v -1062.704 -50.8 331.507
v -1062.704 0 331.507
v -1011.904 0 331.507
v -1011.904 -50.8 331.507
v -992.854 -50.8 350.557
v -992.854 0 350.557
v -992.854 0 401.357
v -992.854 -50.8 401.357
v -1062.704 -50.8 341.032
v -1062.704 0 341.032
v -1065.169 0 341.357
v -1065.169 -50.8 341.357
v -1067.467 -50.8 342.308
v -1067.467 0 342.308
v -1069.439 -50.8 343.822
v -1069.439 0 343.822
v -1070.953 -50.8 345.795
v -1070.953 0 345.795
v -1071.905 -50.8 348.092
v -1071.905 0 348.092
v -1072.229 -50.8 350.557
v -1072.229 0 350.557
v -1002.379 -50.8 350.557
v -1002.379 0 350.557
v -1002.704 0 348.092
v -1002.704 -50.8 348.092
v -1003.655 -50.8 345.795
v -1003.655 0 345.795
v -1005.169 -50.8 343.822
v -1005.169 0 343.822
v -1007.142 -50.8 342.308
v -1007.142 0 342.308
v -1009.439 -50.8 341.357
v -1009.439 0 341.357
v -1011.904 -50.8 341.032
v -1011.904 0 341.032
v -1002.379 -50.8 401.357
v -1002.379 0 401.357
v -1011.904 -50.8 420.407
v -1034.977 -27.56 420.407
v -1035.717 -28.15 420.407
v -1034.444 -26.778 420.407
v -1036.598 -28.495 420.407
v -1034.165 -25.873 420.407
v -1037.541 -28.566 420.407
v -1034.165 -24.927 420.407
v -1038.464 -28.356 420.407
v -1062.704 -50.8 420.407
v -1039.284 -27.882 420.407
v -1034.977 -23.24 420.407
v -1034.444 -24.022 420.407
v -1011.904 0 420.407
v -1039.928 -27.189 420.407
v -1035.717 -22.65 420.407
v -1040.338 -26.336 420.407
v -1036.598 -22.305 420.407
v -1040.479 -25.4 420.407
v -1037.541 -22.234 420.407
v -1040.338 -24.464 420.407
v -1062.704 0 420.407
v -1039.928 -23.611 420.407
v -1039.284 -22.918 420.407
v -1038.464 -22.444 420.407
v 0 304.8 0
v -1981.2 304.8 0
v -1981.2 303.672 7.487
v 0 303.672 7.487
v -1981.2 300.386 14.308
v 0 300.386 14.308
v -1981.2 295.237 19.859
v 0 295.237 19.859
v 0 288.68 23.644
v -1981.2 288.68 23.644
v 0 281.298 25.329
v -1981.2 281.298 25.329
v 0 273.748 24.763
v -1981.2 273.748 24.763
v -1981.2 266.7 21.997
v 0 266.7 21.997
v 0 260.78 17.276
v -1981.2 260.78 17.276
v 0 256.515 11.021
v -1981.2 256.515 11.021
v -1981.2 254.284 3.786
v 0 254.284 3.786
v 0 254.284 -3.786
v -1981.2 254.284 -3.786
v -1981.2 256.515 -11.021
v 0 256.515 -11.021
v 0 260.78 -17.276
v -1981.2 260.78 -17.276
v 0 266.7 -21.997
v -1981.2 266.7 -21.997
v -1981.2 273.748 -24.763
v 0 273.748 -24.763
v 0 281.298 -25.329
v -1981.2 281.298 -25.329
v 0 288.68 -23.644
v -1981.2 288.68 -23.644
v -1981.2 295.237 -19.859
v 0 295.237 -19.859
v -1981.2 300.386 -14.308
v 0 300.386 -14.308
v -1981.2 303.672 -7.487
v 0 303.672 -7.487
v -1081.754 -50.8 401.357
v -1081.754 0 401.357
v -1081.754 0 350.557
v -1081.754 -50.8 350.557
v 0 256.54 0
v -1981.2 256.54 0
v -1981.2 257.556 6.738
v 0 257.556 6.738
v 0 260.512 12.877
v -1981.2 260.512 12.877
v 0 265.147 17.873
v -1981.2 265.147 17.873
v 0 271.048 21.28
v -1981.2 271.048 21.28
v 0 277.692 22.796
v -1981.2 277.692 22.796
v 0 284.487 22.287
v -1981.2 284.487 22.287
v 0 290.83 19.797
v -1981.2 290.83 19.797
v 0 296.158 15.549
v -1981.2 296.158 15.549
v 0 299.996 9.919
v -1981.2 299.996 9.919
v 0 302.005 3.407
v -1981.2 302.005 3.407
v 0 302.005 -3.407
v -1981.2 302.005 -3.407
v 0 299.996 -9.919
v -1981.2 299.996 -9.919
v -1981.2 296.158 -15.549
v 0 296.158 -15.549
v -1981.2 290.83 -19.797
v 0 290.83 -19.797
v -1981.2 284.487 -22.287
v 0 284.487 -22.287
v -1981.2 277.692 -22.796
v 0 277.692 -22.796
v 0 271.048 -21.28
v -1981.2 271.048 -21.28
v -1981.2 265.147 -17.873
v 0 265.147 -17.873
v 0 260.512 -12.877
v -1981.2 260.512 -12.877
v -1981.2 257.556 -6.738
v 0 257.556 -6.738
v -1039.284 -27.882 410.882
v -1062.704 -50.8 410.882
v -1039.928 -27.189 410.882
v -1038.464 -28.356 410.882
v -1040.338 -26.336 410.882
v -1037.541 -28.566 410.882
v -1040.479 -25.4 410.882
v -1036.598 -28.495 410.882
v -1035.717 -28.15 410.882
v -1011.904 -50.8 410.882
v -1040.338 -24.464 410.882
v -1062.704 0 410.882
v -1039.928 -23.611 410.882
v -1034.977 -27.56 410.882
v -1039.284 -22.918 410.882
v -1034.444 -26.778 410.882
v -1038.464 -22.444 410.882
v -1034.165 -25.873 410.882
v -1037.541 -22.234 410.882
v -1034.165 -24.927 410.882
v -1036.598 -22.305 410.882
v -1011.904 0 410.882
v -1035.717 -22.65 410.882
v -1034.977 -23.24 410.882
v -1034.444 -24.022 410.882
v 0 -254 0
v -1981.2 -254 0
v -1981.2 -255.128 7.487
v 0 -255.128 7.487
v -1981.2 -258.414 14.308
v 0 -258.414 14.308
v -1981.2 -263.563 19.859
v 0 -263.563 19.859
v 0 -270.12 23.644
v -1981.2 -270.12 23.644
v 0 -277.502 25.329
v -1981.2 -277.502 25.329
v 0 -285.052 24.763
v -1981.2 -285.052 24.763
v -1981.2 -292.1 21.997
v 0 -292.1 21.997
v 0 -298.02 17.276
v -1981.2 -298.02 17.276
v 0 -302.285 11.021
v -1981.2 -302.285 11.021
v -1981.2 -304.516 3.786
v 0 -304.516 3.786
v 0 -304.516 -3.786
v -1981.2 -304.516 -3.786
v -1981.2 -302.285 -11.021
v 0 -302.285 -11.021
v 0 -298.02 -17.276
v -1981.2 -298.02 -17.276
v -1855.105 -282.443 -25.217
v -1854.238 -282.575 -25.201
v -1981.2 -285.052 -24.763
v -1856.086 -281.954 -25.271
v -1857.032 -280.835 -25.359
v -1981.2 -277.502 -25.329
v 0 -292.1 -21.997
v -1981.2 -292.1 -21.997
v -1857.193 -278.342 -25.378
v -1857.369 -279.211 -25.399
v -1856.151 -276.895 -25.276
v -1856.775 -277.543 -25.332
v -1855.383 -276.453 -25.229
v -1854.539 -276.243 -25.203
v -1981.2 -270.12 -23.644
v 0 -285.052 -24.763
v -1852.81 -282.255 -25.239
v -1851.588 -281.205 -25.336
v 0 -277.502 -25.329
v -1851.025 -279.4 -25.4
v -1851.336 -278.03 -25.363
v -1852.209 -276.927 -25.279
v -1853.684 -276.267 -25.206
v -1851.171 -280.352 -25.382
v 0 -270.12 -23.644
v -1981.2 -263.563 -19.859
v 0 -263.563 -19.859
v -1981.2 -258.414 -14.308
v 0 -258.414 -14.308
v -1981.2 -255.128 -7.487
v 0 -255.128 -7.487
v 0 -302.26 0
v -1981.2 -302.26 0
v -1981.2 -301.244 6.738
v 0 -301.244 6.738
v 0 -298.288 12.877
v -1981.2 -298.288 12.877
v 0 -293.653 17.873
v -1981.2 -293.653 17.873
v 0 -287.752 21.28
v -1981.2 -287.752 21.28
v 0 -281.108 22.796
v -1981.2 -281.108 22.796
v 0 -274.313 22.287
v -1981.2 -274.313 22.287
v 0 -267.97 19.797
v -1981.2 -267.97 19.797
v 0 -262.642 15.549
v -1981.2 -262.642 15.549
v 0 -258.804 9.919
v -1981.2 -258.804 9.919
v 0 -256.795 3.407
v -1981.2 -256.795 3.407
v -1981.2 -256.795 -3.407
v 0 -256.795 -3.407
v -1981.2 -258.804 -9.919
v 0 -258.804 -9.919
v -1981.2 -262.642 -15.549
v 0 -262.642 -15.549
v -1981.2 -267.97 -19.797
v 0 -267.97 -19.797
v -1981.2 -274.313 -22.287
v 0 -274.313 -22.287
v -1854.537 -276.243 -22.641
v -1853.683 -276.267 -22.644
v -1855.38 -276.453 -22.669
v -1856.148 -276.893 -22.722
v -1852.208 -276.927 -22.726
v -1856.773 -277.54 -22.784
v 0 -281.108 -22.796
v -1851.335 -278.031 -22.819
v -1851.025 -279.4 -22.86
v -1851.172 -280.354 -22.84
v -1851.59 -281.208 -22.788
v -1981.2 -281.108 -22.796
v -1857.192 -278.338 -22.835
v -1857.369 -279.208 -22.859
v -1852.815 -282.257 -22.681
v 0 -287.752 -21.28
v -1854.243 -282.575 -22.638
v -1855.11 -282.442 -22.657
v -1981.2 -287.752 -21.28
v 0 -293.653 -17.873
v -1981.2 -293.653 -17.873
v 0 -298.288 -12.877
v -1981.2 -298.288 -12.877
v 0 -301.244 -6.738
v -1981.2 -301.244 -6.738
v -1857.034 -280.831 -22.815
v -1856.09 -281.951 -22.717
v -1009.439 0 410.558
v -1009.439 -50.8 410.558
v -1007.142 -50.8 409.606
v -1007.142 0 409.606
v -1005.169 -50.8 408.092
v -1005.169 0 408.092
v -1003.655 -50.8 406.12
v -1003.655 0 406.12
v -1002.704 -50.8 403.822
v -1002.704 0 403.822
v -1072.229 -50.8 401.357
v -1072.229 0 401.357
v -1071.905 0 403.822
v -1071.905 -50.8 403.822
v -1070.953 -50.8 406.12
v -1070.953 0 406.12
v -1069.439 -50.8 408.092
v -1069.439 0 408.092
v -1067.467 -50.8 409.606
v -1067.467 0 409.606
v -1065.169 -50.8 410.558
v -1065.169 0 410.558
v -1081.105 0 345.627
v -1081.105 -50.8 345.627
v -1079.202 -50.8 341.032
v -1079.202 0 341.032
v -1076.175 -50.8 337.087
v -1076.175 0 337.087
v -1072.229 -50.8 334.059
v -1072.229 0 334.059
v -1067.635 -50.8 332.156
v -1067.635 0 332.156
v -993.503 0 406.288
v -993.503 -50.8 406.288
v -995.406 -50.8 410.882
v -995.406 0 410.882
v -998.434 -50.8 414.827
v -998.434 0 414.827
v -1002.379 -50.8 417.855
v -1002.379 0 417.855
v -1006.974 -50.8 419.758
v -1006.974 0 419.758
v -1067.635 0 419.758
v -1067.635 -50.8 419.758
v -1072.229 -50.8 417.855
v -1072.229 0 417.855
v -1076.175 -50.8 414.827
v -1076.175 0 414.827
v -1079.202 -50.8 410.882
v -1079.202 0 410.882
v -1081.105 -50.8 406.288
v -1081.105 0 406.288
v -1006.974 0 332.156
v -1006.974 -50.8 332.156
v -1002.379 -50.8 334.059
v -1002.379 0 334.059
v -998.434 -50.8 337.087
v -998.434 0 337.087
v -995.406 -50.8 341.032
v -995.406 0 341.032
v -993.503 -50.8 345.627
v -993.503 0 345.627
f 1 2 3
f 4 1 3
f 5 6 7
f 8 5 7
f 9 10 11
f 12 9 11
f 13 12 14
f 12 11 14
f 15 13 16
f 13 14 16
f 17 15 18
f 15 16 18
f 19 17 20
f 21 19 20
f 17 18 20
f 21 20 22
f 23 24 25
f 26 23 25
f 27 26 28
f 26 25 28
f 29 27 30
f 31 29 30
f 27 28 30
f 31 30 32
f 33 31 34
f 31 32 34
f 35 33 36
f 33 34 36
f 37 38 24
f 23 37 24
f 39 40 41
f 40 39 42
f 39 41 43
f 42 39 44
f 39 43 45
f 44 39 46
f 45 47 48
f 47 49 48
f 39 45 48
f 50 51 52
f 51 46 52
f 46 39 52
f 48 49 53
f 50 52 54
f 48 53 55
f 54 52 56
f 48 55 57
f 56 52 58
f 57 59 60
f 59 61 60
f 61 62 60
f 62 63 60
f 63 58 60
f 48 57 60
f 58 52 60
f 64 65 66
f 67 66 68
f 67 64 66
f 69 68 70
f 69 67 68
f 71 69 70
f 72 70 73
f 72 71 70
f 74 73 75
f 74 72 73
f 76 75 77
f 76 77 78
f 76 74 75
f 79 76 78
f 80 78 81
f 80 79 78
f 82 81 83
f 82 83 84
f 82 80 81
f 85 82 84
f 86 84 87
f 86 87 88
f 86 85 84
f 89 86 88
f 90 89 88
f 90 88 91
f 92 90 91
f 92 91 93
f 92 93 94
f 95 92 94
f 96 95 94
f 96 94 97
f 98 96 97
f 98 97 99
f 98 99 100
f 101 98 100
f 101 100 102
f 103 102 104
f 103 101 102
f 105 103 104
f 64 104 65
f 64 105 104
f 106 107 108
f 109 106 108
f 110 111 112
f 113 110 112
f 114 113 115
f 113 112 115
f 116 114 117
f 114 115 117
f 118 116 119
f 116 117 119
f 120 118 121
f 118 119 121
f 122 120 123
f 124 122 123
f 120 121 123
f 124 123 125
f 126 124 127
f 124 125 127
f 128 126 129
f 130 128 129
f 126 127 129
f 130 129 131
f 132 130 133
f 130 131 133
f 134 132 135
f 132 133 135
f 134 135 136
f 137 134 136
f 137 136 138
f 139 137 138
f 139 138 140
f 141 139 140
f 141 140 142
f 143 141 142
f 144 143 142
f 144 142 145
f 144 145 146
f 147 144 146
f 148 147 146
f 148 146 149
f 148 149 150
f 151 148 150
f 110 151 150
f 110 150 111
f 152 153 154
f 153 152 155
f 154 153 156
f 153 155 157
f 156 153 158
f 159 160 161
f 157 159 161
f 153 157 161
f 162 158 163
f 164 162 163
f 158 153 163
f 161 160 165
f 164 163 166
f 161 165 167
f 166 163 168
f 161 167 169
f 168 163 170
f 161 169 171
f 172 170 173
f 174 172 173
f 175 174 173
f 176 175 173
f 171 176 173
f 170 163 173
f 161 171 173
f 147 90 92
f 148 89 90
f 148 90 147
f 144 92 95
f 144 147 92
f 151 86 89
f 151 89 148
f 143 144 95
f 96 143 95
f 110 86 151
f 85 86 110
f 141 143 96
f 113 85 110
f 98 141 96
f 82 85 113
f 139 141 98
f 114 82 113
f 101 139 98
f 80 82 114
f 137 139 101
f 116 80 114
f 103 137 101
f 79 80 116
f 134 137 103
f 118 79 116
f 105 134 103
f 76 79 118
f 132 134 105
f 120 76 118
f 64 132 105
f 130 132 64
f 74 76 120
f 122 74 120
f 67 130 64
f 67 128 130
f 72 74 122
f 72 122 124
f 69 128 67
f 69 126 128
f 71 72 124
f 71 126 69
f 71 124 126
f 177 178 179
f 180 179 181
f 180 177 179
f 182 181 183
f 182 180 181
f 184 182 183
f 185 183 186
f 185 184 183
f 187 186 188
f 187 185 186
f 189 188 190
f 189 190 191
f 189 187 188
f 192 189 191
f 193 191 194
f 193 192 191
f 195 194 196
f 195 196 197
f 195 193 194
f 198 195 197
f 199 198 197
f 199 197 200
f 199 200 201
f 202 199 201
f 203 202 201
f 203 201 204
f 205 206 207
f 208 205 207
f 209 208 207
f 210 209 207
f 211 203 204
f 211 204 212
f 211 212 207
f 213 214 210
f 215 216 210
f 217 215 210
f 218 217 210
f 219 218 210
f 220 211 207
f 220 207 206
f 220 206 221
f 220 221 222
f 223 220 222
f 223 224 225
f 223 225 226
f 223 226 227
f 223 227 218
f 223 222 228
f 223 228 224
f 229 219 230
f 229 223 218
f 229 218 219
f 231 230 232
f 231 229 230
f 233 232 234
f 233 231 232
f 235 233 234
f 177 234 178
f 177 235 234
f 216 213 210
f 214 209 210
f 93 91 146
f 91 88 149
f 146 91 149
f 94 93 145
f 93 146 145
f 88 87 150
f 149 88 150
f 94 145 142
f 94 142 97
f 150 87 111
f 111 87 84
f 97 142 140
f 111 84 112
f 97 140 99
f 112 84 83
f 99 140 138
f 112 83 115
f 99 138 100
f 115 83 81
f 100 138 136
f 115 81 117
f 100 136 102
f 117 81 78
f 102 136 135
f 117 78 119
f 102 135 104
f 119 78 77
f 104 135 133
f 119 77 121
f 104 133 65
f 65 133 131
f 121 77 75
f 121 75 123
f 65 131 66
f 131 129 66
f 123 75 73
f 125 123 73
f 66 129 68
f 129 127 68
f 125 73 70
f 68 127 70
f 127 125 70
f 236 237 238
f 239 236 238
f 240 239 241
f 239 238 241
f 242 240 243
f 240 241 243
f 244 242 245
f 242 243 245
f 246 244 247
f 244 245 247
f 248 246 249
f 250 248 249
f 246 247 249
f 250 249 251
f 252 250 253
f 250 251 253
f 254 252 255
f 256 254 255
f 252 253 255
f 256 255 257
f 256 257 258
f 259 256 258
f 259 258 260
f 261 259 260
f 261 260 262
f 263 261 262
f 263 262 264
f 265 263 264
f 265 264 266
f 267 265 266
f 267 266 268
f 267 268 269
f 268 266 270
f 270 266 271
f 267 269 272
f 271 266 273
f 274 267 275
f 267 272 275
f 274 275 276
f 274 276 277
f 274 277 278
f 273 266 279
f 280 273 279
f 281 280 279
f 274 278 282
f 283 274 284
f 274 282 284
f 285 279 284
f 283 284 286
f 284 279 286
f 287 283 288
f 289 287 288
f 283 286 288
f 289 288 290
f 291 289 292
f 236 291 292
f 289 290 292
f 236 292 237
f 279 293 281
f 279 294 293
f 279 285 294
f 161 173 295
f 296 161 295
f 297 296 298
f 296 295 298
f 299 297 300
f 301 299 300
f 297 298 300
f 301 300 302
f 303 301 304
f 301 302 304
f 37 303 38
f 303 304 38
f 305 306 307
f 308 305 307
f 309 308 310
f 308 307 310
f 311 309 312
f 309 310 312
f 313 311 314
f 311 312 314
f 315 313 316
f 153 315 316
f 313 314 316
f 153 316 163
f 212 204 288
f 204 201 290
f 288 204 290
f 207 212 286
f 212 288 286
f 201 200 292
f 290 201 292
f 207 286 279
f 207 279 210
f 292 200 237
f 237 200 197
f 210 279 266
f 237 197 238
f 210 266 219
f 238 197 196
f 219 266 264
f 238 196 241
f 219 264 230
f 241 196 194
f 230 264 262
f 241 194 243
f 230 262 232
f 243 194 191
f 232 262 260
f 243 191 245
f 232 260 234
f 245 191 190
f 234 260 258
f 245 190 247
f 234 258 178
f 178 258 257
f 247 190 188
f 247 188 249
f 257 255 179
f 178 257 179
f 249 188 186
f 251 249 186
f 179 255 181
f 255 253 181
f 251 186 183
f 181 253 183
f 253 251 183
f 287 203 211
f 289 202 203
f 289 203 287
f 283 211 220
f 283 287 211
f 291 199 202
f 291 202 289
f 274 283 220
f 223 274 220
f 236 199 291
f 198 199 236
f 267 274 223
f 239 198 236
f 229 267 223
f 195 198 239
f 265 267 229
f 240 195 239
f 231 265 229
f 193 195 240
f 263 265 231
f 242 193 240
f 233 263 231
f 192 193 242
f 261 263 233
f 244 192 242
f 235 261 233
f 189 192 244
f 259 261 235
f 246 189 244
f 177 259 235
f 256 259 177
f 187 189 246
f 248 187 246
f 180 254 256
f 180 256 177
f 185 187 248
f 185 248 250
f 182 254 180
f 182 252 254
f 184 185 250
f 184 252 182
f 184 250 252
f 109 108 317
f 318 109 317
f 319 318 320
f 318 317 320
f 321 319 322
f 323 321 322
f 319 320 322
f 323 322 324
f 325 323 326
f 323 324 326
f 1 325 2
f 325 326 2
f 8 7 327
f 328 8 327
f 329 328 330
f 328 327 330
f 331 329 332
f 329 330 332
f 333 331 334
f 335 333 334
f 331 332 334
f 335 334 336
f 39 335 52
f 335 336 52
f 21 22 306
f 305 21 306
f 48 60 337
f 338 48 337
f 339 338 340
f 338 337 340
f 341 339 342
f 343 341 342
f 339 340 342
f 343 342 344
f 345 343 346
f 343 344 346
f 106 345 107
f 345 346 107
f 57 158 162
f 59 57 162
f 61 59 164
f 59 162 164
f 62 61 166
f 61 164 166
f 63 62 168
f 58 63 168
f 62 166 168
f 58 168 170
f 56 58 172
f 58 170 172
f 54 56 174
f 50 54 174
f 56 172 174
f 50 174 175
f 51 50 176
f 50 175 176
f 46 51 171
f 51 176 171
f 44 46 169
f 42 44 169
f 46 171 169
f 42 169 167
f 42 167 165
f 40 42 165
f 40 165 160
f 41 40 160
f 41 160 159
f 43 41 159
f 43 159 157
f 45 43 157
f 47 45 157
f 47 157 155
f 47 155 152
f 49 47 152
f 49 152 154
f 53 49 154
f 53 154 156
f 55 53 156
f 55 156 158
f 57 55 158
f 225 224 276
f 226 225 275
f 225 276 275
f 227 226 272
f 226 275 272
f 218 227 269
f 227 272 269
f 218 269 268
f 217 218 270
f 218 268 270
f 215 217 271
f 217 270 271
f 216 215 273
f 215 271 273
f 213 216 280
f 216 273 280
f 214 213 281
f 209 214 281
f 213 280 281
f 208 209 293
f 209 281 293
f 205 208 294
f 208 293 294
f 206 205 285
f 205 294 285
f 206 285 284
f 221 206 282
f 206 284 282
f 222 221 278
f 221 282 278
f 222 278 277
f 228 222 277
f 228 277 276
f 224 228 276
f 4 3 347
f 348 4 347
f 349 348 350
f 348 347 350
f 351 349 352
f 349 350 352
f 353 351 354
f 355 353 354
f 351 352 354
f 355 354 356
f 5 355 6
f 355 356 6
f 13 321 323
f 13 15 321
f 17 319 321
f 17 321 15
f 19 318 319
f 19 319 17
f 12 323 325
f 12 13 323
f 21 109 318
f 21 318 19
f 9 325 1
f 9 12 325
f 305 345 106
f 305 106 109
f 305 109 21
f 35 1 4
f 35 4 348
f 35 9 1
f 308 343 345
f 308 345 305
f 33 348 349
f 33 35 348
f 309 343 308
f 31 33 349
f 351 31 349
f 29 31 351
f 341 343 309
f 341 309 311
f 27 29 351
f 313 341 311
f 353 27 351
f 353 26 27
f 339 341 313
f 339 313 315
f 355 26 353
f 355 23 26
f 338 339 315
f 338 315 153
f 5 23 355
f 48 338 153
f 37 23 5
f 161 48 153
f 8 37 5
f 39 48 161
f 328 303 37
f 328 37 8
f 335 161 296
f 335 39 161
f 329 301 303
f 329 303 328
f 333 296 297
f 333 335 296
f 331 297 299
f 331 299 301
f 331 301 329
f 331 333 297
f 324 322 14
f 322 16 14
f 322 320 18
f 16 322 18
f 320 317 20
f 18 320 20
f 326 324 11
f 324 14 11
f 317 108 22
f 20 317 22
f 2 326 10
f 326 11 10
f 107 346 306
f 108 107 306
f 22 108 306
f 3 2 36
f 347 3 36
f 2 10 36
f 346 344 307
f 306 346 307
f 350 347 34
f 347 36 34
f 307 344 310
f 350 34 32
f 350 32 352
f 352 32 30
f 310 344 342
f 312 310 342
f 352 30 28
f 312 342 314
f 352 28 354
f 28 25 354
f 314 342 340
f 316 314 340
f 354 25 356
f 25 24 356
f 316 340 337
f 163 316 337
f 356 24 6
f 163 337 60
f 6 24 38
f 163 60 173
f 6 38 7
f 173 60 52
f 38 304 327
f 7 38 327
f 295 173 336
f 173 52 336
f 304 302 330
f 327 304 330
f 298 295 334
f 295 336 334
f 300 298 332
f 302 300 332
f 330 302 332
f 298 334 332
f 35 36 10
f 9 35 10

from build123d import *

# Parameters (mm, degrees)
F0_R      = 25.4
F1_DEPTH  = 1981.2
F2_D      = 45.72
F4_D      = 6.35
F4_DEPTH  = 50.8
F4_TIP    = 1.9077324654
F5_R      = 25.4
F6_DEPTH  = 1981.2
F7_D      = 45.72
F9_DEPTH  = 50.8
F11_D     = 6.35
F11_DEPTH = 12.7
F11_TIP   = 1.9077324654


with BuildPart() as f1:
    # F0 (on Right) → F1 (new body)
    with BuildSketch(Plane.YZ):
        with Locations((-279.4, 0)):
            Circle(F0_R)
    extrude(amount=-F1_DEPTH)

    # F2 (through all)
    with Locations(Plane.YZ):
        with Locations((-279.4, 0)):
            Hole(F2_D / 2)

    # F4 (one way)
    with BuildSketch(Plane.XY):
        with Locations((-1854.2, -279.4)):
            Circle(F4_D / 2)
    extrude(amount=-F4_DEPTH, mode=Mode.SUBTRACT)
    with Locations(Plane.XY):
        with Locations((-1854.2, -279.4)):
            with Locations((0, 0, -(F4_DEPTH + F4_TIP / 2))):  # 118° drill point
                Cone(0, F4_D / 2, F4_TIP, mode=Mode.SUBTRACT)


with BuildPart() as f6:
    # F5 (on face) → F6 (new body)
    with BuildSketch(Plane.YZ):
        with Locations((279.4, 0)):
            Circle(F5_R)
    extrude(amount=-F6_DEPTH)

    # F7 (through all)
    with Locations(Plane.YZ):
        with Locations((279.4, 0)):
            Hole(F7_D / 2)


with BuildPart() as f9:
    # F8 (on Front) → F9 (new body)
    with BuildSketch(Plane.XZ):
        with BuildLine():
            Line((-1011.9042306555, 420.4070654154), (-1062.7042306555, 420.4070654154))
            ThreePointArc((-1062.7042306555, 420.4070654154), (-1076.1746148371, 414.827449597), (-1081.7542306555, 401.3570654154))
            Line((-1081.7542306555, 401.3570654154), (-1081.7542306555, 350.5570654154))
            ThreePointArc((-1081.7542306555, 350.5570654154), (-1076.1746148371, 337.0866812338), (-1062.7042306555, 331.5070654154))
            Line((-1062.7042306555, 331.5070654154), (-1011.9042306555, 331.5070654154))
            ThreePointArc((-1011.9042306555, 331.5070654154), (-998.4338464739, 337.0866812338), (-992.8542306555, 350.5570654154))
            Line((-992.8542306555, 350.5570654154), (-992.8542306555, 401.3570654154))
            ThreePointArc((-992.8542306555, 401.3570654154), (-998.4338464739, 414.827449597), (-1011.9042306555, 420.4070654154))
        make_face()
        with BuildLine():
            ThreePointArc((-1072.2292306555, 401.3570654154), (-1069.4394227463, 408.0922575062), (-1062.7042306555, 410.8820654154))
            Line((-1062.7042306555, 410.8820654154), (-1011.9042306555, 410.8820654154))
            ThreePointArc((-1011.9042306555, 410.8820654154), (-1005.1690385647, 408.0922575062), (-1002.3792306555, 401.3570654154))
            Line((-1002.3792306555, 401.3570654154), (-1002.3792306555, 350.5570654154))
            ThreePointArc((-1002.3792306555, 350.5570654154), (-1005.1690385647, 343.8218733246), (-1011.9042306555, 341.0320654154))
            Line((-1011.9042306555, 341.0320654154), (-1062.7042306555, 341.0320654154))
            ThreePointArc((-1062.7042306555, 341.0320654154), (-1069.4394227463, 343.8218733246), (-1072.2292306555, 350.5570654154))
            Line((-1072.2292306555, 350.5570654154), (-1072.2292306555, 401.3570654154))
        make_face(mode=Mode.SUBTRACT)
    extrude(amount=F9_DEPTH)

    # F11
    with Locations(Plane.XY.offset(420.4070654154)):
        with Locations((-1037.3042306555, -25.4)):
            Hole(F11_D / 2, depth=F11_DEPTH)
            with Locations((0, 0, -(F11_DEPTH + F11_TIP / 2))):  # 118° drill point
                Cone(0, F11_D / 2, F11_TIP, mode=Mode.SUBTRACT)


solid = Compound([f1.part, f6.part, f9.part])
